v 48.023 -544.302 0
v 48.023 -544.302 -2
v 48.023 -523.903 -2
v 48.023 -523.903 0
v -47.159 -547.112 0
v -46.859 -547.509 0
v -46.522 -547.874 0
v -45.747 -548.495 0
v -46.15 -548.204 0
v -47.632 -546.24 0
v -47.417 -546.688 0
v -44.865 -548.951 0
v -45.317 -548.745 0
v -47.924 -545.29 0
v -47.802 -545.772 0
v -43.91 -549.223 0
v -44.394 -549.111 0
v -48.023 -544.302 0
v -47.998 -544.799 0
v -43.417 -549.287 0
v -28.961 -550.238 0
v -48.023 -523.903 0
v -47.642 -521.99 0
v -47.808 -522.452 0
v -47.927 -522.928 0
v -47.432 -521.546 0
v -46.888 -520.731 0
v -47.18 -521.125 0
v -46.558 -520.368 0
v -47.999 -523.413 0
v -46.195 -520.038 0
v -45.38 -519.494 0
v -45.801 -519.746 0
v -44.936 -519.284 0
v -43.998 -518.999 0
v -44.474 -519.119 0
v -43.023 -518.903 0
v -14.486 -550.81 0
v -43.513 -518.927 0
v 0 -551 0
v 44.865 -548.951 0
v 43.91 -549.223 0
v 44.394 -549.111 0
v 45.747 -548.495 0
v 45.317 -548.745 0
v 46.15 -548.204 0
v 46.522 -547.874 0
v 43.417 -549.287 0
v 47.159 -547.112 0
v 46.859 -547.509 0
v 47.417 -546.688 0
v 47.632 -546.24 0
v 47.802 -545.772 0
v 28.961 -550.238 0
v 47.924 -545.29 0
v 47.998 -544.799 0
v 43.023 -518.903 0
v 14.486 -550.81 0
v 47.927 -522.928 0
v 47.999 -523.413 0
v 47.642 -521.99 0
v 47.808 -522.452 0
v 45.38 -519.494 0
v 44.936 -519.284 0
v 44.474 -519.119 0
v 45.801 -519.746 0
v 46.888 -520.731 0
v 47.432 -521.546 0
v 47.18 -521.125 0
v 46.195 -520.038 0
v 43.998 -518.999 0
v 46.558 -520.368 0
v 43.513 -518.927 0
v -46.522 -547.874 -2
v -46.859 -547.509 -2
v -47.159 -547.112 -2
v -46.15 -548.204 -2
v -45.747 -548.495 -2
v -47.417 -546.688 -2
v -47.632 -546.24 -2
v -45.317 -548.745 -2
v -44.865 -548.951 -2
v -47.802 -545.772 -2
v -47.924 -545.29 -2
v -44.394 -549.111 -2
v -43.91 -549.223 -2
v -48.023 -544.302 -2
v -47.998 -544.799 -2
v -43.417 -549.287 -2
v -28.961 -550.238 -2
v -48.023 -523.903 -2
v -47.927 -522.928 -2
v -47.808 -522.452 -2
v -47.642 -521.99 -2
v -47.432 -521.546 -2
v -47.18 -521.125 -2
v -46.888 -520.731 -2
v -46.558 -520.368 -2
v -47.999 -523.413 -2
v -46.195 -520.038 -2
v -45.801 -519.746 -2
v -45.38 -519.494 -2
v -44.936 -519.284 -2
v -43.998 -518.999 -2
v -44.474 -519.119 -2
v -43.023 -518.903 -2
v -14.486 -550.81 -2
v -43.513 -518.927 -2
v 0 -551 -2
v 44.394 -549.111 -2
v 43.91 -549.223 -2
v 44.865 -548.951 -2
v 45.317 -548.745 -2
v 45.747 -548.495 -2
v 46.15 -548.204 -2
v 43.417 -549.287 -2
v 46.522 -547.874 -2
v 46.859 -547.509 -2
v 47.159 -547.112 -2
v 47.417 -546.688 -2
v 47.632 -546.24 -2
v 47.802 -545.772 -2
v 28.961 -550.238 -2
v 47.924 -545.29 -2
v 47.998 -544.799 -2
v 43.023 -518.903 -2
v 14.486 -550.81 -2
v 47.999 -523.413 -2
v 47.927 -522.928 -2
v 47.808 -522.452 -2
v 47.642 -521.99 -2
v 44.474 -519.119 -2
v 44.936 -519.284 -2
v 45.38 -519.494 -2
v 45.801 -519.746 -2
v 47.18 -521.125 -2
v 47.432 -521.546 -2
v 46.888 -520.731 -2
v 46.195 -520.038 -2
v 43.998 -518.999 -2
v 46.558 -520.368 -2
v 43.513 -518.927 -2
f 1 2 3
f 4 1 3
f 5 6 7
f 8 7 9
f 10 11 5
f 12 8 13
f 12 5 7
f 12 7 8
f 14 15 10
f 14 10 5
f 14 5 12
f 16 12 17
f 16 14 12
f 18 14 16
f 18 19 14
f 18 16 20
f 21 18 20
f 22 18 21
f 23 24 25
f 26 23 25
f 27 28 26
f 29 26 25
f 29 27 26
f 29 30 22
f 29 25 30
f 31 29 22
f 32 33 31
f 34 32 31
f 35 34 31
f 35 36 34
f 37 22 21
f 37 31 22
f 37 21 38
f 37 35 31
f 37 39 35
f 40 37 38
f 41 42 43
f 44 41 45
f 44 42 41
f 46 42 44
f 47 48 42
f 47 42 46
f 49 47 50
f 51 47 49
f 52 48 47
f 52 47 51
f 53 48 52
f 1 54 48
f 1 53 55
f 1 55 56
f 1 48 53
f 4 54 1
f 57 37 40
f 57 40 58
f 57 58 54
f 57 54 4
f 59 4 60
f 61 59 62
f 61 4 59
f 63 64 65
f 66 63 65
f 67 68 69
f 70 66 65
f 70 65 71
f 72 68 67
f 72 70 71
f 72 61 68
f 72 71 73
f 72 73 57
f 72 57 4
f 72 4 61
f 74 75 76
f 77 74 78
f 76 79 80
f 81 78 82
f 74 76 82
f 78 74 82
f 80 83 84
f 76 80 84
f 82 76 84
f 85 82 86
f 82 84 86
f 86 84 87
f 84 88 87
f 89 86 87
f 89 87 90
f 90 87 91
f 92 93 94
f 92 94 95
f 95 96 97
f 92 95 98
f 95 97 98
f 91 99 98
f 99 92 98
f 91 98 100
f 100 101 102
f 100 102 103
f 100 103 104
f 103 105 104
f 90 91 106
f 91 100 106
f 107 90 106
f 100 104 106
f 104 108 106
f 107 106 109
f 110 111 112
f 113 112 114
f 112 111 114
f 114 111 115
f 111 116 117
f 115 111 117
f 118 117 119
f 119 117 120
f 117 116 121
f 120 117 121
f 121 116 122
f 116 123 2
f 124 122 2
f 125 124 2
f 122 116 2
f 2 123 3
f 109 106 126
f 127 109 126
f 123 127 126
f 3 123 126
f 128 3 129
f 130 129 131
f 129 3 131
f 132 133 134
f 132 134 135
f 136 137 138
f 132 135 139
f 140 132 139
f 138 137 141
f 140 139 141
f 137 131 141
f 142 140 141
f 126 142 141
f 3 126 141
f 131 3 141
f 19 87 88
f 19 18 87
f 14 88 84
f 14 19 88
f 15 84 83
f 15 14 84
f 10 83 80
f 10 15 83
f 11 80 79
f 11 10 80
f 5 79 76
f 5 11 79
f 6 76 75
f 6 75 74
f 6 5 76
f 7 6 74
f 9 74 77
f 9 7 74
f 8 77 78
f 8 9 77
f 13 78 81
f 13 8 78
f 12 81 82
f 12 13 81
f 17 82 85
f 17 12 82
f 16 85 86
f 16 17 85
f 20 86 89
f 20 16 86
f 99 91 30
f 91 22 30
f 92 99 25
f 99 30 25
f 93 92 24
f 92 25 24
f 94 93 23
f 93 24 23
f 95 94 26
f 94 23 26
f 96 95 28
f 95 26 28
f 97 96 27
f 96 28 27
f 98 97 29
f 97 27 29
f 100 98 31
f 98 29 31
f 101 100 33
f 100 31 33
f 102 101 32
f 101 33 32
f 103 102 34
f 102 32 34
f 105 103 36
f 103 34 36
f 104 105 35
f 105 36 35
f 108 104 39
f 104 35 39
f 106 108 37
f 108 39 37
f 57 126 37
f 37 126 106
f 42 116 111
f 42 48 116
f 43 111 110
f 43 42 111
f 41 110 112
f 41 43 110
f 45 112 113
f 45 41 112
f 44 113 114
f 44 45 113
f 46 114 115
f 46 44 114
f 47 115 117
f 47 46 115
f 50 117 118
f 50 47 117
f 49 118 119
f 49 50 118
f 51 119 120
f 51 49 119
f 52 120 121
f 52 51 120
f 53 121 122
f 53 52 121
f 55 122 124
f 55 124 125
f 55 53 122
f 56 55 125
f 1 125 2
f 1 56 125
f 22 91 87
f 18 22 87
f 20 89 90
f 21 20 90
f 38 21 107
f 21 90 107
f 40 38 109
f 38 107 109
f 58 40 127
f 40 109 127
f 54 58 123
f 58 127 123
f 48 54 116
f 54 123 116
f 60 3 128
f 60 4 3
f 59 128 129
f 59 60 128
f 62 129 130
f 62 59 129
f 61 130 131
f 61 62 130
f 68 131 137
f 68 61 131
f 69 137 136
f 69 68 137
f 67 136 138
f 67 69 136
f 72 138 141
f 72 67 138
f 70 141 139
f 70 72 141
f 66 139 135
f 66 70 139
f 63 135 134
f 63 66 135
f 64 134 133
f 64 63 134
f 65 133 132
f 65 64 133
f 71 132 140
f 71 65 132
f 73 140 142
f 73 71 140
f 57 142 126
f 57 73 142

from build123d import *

# Parameters (mm, degrees)
SM_START               = -2
SM_BASE_FLANGE_1_DEPTH = 2
FILLET_1_R             = 5


# Read off the part's stored shape, not the designer's step: 基体-法兰1
with BuildPart() as part:
    # 基体-法兰1 outline → 基体-法兰1 (new body)
    with BuildSketch(Plane.XY.offset(SM_START)):
        with BuildLine():
            Line((-48.022814254, -518.903278649), (-48.022814254, -548.903278649))
            ThreePointArc((-48.022814254, -548.903278649), (0, -551), (48.022814254, -548.903278649))
            Line((48.022814254, -548.903278649), (48.022814254, -518.903278649))
            Line((48.022814254, -518.903278649), (-48.022814254, -518.903278649))
        make_face()
    extrude(amount=SM_BASE_FLANGE_1_DEPTH)

    # 圆角1
    fillet_1_edges = [part.edges().sort_by_distance(p)[0] for p in [
        (-48.022814254, -548.903278649, -1),
        (-48.022814254, -518.903278649, -1),
        (48.022814254, -518.903278649, -1),
        (48.022814254, -548.903278649, -1),
    ]]
    fillet(fillet_1_edges, radius=FILLET_1_R)


solid = part.part
